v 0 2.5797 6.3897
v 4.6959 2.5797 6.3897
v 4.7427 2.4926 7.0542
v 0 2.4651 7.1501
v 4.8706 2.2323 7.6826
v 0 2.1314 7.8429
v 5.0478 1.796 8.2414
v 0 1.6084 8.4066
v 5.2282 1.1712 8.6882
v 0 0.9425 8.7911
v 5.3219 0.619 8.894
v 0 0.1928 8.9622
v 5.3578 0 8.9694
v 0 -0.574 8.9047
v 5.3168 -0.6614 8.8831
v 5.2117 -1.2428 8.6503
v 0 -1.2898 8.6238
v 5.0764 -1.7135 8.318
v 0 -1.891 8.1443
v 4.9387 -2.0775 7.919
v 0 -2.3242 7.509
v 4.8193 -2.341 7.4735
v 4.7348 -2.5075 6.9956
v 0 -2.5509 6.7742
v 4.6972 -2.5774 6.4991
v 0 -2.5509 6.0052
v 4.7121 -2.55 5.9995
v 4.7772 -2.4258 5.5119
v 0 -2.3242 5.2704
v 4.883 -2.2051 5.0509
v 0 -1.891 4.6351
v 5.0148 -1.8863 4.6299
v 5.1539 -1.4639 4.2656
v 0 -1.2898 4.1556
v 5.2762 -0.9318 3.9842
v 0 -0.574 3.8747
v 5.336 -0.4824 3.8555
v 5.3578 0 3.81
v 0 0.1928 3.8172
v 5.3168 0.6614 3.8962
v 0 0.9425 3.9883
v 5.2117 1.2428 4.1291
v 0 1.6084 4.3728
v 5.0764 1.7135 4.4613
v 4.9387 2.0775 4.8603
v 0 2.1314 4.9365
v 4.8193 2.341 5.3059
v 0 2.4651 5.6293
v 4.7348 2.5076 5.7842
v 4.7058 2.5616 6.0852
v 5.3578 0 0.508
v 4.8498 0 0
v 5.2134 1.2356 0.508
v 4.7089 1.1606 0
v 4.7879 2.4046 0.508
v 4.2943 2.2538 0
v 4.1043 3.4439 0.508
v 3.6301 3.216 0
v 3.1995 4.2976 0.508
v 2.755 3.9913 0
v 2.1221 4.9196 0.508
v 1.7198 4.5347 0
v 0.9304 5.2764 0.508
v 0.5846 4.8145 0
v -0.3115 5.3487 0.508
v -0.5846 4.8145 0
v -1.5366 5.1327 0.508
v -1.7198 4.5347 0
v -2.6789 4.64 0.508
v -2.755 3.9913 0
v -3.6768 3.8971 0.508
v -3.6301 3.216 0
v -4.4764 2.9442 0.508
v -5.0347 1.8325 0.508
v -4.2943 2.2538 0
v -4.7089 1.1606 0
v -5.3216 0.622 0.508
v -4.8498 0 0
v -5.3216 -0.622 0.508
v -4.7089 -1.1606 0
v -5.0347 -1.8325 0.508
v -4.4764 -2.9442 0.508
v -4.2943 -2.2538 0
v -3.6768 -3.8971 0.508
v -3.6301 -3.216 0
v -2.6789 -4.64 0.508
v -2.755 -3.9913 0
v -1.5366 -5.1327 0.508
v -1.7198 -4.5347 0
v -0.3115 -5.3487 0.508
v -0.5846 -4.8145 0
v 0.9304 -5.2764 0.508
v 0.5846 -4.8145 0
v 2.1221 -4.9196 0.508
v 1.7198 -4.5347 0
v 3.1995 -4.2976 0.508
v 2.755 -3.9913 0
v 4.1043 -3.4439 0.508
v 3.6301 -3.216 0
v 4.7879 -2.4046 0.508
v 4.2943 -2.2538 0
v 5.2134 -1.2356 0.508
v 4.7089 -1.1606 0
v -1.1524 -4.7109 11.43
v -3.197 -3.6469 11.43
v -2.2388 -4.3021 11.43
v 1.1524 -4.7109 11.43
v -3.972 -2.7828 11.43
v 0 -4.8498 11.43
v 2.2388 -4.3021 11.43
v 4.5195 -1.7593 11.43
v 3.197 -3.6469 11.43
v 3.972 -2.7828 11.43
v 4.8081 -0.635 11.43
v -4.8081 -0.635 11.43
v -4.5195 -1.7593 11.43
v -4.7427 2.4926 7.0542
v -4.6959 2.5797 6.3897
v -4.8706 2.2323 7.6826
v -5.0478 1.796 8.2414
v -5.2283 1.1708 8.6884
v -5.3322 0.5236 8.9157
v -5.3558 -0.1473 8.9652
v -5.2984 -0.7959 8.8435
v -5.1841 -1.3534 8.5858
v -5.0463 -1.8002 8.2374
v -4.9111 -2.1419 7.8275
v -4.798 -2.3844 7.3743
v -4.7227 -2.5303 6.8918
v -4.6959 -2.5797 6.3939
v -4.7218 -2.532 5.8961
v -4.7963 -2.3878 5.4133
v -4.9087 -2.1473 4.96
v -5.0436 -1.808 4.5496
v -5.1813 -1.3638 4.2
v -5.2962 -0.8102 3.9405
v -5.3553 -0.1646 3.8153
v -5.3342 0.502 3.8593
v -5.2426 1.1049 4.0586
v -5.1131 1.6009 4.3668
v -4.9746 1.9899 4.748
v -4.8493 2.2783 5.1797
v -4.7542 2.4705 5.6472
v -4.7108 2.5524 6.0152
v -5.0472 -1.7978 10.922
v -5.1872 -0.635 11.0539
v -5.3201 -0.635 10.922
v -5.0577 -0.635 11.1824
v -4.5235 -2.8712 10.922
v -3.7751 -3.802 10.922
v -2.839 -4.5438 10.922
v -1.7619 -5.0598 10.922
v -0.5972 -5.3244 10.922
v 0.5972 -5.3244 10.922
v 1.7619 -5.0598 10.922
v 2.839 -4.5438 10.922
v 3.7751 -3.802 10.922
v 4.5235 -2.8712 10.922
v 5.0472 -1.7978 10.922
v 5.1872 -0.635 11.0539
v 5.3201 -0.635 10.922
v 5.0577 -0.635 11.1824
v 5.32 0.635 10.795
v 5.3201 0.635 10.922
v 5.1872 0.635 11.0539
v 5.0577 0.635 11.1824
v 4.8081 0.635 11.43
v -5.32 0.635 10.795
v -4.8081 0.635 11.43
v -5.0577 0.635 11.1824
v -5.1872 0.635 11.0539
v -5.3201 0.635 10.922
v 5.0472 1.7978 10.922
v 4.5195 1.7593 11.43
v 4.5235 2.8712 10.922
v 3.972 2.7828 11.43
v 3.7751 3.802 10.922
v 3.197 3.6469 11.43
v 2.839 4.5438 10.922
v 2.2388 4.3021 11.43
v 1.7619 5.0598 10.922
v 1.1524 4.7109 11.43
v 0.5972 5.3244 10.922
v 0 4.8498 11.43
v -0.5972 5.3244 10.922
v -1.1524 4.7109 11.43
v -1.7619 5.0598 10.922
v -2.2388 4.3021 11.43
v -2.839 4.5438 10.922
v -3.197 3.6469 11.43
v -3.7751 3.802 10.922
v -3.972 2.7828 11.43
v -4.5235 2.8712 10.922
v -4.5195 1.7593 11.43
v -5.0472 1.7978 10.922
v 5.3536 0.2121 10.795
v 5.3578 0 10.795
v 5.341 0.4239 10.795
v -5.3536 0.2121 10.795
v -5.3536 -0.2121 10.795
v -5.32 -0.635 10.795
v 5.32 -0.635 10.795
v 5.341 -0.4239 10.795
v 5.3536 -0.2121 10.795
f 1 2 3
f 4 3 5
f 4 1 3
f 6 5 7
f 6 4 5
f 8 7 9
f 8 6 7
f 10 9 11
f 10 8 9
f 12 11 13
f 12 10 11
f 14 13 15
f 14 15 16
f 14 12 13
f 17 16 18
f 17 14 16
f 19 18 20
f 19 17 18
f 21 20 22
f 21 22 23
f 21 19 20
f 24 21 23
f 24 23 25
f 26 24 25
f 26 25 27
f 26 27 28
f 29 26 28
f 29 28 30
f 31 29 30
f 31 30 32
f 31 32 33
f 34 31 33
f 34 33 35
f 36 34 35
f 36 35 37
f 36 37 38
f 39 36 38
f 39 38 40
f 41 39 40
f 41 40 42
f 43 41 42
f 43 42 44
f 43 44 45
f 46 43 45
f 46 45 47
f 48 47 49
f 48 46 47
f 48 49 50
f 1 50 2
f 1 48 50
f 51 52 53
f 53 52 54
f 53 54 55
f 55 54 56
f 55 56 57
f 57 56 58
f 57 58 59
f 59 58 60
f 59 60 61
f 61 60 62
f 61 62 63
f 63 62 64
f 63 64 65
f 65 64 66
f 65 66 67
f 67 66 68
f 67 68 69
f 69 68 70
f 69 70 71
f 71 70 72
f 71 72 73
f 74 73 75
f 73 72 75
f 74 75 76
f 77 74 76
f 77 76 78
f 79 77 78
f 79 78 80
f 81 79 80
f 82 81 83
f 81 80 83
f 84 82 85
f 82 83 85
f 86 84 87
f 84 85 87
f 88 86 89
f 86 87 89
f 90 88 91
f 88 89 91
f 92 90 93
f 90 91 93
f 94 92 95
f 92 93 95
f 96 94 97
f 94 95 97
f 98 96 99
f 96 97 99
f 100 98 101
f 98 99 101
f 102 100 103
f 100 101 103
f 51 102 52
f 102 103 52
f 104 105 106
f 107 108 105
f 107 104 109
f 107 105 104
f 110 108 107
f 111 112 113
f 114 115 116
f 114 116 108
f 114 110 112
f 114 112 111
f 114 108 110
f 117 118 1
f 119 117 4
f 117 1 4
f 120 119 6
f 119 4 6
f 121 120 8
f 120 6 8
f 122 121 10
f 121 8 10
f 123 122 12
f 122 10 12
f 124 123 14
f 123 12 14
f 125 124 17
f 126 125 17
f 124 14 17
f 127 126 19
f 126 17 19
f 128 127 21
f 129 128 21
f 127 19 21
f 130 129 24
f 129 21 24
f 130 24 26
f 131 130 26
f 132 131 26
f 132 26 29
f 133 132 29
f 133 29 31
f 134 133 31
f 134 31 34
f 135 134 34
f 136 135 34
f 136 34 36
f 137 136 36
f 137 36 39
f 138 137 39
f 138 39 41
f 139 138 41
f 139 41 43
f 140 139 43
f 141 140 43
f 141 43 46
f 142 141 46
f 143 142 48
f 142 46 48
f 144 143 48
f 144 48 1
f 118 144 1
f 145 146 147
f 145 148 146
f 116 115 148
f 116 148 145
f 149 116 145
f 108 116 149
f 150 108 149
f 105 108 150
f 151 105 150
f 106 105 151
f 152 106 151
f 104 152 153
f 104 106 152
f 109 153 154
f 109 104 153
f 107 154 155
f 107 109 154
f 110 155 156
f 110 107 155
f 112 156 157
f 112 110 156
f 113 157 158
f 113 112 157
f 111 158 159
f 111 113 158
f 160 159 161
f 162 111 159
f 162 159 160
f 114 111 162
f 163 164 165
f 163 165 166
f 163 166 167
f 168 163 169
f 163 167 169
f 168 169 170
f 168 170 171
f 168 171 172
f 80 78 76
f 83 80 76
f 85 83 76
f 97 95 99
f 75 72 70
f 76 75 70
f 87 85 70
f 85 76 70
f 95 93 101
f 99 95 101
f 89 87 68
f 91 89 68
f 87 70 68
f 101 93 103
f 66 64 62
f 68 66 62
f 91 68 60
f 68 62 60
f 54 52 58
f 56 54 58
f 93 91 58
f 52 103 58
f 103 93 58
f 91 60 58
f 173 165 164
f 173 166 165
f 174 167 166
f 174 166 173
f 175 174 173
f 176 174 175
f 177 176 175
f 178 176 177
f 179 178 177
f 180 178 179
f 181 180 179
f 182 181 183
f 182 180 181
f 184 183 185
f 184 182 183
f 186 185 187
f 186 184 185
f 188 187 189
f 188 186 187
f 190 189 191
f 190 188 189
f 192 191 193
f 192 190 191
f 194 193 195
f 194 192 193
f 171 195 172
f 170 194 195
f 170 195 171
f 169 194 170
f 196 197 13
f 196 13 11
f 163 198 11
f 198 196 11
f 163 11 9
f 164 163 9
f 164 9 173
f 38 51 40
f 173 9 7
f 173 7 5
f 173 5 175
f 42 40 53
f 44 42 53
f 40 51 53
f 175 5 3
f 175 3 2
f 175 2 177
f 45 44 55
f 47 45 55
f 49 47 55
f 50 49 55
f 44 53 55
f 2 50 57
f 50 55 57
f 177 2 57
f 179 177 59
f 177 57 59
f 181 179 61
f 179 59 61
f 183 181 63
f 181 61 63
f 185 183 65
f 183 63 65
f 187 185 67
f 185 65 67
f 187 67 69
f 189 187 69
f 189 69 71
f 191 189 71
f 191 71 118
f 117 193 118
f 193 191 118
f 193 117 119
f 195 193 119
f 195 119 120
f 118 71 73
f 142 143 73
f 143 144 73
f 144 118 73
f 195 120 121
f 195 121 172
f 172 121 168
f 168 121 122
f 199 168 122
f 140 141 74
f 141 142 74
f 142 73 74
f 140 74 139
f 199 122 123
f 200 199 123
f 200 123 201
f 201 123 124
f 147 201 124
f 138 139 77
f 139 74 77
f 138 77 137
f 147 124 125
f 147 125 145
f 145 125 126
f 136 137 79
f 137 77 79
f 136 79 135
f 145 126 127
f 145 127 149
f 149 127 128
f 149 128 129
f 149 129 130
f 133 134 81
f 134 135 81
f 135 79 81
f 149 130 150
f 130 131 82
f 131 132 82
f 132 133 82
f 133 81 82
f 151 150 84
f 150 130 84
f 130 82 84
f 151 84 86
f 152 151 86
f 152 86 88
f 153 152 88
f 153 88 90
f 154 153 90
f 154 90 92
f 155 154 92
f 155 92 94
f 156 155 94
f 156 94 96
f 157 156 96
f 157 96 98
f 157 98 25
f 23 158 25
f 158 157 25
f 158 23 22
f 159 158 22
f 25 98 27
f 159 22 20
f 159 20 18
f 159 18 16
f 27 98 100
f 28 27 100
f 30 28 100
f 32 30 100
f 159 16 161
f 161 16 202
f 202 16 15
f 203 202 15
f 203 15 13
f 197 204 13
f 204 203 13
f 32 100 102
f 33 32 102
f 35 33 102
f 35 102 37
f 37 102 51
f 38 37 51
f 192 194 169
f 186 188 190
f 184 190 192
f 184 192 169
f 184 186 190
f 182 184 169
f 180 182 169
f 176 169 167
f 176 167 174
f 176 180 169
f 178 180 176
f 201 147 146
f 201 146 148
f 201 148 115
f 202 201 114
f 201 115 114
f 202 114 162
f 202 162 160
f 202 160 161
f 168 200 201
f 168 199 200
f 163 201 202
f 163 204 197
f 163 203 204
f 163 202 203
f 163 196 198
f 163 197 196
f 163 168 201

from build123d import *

# Parameters (mm, degrees)
F0_R          = 5.357813
F1_DEPTH      = 11.43
F2_R          = 2.579688
F3_DEPTH      = 25.4
F3_DEPTH_BACK = 25.4
F5_DEPTH      = 0.635
F6_SIZE       = 0.508


with BuildPart() as f1:
    # F0 (on Top) → F1 (new body)
    with BuildSketch(Plane.XY):
        Circle(F0_R)
    extrude(amount=F1_DEPTH)

    # F2 (on Right) → F3 (cut, two sides)
    with BuildSketch(Plane.YZ) as f3_sk:
        with Locations((0, 6.389687)):
            Circle(F2_R)
    extrude(amount=F3_DEPTH, mode=Mode.SUBTRACT)
    extrude(f3_sk.sketch, amount=-F3_DEPTH_BACK, mode=Mode.SUBTRACT)

    # F4 (on face) → F5 (cut)
    with BuildSketch(Plane.XY.offset(11.43)):
        with BuildLine():
            Line((5.32005, 0.635), (-5.32005, 0.635))
            ThreePointArc((-5.32005, 0.635), (-5.379818, 0), (-5.32005, -0.635))
            Line((-5.32005, -0.635), (5.32005, -0.635))
            ThreePointArc((5.32005, -0.635), (5.379818, 0), (5.32005, 0.635))
        make_face()
    extrude(amount=-F5_DEPTH, mode=Mode.SUBTRACT)

    # F6
    f6_edges = [f1.edges().sort_by_distance(p)[0] for p in [
        (0, -5.357813, 11.43),
        (0, 5.357813, 11.43),
        (-5.357813, 0, 0),
    ]]
    chamfer(f6_edges, length=F6_SIZE)


solid = f1.part
